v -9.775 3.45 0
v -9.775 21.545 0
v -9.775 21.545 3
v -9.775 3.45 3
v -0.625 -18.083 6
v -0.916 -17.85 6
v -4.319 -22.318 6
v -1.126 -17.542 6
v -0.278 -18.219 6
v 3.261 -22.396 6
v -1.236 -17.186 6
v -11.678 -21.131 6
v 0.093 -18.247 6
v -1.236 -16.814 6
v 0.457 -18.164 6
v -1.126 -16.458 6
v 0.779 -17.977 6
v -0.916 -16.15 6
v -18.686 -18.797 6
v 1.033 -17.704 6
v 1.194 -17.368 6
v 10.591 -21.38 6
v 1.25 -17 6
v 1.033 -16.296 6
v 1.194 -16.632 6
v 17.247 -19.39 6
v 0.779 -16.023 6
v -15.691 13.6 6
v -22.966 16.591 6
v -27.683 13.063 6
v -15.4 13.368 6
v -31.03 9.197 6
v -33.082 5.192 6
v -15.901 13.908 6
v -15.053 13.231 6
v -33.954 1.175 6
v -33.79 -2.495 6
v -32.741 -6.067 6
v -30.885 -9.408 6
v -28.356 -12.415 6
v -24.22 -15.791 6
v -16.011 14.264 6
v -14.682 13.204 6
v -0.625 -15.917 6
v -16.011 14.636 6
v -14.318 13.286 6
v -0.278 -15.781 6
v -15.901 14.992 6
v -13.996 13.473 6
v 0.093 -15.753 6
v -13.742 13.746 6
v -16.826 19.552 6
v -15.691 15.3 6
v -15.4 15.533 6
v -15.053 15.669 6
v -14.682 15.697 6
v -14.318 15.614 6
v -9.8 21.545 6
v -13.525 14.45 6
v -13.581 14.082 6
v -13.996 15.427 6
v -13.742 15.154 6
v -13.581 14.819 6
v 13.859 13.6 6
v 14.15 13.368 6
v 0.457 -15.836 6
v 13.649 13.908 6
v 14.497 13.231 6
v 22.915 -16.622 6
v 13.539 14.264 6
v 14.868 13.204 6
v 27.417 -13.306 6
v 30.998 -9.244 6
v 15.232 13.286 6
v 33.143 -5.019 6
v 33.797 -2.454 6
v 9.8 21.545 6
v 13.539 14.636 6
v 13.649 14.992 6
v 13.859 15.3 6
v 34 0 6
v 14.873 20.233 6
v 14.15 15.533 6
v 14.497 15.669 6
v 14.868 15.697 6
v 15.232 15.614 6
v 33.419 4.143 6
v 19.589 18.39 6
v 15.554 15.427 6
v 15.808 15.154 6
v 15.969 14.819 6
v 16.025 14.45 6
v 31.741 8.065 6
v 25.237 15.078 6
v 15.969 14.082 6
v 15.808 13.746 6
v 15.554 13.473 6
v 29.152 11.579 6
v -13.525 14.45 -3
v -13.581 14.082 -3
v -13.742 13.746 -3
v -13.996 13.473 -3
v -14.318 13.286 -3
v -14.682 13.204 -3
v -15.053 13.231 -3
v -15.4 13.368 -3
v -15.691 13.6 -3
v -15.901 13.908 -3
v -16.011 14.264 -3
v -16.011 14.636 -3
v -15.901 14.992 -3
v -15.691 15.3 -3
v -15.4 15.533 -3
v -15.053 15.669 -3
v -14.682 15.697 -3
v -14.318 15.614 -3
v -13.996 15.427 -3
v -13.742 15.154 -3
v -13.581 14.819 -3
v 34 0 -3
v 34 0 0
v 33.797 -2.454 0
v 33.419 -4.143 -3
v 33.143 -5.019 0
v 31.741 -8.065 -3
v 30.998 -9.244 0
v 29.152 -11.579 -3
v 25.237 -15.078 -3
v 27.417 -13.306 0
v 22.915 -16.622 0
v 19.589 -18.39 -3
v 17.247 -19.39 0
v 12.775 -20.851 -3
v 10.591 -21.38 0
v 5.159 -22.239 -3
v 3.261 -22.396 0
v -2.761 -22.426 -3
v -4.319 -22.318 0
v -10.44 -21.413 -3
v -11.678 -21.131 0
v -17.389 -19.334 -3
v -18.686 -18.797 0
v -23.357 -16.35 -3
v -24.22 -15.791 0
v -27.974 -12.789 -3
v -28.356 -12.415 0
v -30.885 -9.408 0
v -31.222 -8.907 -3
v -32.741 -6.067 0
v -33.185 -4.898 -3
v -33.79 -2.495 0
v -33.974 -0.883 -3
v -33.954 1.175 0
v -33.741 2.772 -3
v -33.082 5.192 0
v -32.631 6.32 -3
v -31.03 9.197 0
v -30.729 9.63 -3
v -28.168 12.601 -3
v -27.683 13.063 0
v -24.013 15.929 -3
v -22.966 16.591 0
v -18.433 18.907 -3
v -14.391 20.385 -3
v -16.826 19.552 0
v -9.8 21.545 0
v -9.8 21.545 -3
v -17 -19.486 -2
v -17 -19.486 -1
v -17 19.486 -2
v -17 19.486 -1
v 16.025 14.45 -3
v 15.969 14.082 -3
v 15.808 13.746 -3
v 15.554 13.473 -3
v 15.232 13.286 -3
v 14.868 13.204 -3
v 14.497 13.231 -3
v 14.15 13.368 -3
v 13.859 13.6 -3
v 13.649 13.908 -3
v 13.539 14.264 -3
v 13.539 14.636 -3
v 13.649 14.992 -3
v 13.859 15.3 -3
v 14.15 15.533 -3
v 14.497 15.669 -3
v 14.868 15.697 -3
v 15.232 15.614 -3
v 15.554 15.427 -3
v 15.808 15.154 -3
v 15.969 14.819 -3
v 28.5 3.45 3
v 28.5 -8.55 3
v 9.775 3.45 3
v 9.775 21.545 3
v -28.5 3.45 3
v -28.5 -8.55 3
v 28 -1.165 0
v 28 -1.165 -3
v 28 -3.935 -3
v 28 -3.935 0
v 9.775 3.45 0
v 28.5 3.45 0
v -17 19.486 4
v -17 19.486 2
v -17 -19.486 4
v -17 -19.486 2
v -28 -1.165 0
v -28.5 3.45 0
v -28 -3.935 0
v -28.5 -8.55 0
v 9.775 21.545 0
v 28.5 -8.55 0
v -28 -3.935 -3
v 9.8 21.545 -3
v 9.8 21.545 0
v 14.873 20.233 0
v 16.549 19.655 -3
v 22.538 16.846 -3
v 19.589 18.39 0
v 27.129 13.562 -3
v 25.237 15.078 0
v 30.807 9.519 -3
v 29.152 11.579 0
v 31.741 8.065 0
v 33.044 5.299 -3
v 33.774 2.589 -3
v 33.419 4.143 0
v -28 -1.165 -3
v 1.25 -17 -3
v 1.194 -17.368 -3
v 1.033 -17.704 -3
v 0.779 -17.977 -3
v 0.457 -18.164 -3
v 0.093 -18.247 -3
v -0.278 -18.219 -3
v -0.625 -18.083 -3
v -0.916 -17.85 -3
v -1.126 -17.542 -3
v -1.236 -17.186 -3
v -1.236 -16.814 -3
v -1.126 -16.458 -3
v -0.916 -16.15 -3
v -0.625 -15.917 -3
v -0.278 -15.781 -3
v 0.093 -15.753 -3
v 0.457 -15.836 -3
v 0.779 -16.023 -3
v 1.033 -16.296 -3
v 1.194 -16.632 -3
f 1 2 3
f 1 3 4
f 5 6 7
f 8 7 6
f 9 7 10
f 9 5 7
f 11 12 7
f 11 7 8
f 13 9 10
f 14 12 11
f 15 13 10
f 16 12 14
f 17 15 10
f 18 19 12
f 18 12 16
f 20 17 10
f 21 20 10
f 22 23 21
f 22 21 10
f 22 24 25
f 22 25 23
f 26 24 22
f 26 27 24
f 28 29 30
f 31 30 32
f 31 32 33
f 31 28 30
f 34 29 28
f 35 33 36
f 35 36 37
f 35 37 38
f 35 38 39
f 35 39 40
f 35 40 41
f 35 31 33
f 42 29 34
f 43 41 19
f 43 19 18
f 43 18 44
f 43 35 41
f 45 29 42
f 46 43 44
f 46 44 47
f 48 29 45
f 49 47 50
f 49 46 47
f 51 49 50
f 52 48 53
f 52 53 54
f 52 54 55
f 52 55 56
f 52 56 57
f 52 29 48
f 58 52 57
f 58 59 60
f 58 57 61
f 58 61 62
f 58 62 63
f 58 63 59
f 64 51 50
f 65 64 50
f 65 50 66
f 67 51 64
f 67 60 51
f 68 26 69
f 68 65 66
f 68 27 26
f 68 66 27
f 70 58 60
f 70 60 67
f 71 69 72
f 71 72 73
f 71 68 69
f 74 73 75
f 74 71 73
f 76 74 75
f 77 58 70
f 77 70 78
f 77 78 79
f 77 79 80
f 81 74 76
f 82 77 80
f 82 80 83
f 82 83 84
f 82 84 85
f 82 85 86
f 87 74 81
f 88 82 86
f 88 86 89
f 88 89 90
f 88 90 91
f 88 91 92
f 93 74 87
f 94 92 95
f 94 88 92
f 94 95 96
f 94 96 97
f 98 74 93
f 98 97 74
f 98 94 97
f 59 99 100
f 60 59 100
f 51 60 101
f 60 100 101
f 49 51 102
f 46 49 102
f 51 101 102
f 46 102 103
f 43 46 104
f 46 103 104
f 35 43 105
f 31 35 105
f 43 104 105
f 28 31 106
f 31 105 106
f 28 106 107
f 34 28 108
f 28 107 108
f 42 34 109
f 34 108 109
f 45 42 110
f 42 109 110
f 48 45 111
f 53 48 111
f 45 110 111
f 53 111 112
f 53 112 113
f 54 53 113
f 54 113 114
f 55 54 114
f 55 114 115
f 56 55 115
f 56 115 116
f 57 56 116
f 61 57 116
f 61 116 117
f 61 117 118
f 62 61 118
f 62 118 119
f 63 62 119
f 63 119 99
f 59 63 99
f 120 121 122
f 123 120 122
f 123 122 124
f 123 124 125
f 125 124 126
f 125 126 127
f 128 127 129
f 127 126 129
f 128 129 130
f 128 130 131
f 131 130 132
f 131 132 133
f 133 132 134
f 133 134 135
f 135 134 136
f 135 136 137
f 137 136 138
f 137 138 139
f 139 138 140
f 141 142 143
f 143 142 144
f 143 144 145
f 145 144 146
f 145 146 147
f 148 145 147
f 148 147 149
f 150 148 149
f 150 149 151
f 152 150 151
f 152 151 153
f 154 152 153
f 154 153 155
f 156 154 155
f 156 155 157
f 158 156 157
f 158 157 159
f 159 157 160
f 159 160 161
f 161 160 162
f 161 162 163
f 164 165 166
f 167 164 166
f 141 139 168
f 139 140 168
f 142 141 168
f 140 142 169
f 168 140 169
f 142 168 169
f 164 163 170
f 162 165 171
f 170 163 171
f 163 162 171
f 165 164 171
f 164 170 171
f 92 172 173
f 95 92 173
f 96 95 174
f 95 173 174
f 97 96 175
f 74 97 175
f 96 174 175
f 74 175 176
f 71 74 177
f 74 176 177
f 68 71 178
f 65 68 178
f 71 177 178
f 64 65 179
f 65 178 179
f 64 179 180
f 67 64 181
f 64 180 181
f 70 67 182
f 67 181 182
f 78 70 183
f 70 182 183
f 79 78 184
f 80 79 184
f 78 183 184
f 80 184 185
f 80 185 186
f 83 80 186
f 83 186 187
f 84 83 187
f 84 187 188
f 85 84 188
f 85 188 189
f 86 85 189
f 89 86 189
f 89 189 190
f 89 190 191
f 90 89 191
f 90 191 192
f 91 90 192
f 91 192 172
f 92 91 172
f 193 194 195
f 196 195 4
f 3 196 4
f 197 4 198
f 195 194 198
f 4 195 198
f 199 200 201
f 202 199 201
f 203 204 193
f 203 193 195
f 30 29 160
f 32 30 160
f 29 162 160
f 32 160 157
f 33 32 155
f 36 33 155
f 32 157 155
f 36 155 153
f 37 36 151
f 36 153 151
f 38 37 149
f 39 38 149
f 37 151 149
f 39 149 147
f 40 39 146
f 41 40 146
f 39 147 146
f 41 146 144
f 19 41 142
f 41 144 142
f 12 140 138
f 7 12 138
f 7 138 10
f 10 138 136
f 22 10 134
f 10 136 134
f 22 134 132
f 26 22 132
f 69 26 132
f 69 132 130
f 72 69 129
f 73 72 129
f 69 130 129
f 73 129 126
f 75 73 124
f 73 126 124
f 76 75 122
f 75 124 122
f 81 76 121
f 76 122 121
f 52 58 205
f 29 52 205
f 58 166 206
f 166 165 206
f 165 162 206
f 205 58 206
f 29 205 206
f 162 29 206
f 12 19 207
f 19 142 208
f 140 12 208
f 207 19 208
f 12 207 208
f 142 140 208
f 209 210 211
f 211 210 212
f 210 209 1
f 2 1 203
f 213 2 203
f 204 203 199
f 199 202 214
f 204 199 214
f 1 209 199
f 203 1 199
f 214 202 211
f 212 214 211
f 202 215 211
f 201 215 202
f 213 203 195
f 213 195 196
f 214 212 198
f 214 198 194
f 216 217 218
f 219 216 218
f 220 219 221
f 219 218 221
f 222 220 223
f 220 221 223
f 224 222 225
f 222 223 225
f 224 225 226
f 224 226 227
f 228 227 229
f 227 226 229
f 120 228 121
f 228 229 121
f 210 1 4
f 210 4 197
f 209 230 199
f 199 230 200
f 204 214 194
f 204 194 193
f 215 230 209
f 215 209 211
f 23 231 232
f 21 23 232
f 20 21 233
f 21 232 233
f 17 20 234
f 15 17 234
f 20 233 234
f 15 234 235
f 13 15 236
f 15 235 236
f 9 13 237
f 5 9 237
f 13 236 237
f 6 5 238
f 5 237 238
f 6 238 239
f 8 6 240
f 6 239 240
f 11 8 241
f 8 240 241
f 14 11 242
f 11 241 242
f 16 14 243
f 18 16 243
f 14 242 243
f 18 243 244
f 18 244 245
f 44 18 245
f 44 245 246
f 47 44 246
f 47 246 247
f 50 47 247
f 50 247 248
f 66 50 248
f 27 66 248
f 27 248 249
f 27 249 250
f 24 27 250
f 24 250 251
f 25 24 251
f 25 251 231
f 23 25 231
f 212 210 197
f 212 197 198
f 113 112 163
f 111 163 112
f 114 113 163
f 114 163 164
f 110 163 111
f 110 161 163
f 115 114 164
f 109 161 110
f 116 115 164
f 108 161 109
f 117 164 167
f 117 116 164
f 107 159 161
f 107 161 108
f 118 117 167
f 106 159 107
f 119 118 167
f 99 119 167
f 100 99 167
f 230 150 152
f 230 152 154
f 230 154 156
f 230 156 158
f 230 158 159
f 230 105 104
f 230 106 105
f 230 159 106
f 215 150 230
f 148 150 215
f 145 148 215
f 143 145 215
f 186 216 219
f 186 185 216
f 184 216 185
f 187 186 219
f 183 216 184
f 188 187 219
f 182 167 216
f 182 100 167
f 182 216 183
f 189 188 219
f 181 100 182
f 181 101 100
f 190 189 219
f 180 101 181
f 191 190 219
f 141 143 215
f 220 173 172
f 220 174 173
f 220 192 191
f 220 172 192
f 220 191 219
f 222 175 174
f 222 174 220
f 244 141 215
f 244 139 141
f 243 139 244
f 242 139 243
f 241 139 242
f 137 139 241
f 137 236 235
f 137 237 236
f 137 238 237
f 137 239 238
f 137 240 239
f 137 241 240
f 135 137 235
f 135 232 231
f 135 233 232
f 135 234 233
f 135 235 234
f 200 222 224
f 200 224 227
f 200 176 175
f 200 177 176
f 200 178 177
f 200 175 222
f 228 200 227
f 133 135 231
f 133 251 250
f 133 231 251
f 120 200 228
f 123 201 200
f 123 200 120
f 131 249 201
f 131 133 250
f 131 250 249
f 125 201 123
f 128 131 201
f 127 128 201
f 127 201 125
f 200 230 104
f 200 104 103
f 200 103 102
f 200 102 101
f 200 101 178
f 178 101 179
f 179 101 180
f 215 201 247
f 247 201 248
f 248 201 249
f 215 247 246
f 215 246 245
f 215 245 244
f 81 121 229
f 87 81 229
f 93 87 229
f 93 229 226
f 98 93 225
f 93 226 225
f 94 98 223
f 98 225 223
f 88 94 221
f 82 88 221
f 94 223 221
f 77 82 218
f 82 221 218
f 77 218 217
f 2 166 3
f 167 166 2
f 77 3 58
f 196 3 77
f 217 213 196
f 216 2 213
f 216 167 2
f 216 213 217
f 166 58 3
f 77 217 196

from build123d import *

# Parameters (mm, degrees)
PAD_DEPTH       = 6
POCKET_DEPTH    = 3
PAD001_DEPTH    = 3
SKETCH003_W     = 56
SKETCH003_H     = 2.77
POCKET001_DEPTH = 3
SKETCH004_W     = 19.6
SKETCH004_H     = 1
POCKET002_DEPTH = 9.001
SKETCH005_R     = 1.25
POCKET003_DEPTH = 9.001


with BuildPart() as part:
    # Sketch → Pad (new body)
    with BuildSketch(Plane.XY):
        with BuildLine():
            add(Edge.make_bspline(
                [(34, 0), (34, 38.971143), (-17, 19.485572), (-68, 0), (-17, -19.485572), (34, -38.971143), (34, 0)],
                knots=[0, 0, 0, 2.094395, 2.094395, 4.18879, 4.18879, 6.283185, 6.283185, 6.283185], degree=2, weights=[1, 0.5, 1, 0.5, 1, 0.5, 1]))
        make_face()
    extrude(amount=PAD_DEPTH)

    # Sketch001 (on Face2 of Pad) → Pocket (cut)
    with BuildSketch(Plane(origin=(0, 0, 0), x_dir=(1, 0, 0), z_dir=(0, 0, -1))):
        Polygon((9.775, -3.450064), (9.775, -21.550064), (-9.775, -21.550064), (-9.775, -3.450064), (-28.5, -3.450064), (-28.5, 8.549936), (28.5, 8.549936), (28.5, -3.450064), align=None)
    extrude(amount=-POCKET_DEPTH, mode=Mode.SUBTRACT)

    # Sketch002 (on Face2 of Pocket) → Pad001 (join)
    with BuildSketch(Plane(origin=(0, 0, 0), x_dir=(1, 0, 0), z_dir=(0, 0, -1))):
        with BuildLine():
            add(Edge.make_bspline(
                [(34, 0), (34, 38.971143), (-17, 19.485572), (-68, 0), (-17, -19.485572), (34, -38.971143), (34, 0)],
                knots=[0, 0, 0, 2.094395, 2.094395, 4.18879, 4.18879, 6.283185, 6.283185, 6.283185], degree=2, weights=[1, 0.5, 1, 0.5, 1, 0.5, 1]))
        make_face()
    extrude(amount=PAD001_DEPTH)

    # Sketch003 (on Face4 of Pad001) → Pocket001 (cut)
    with BuildSketch(Plane(origin=(0, 0, -3), x_dir=(1, 0, 0), z_dir=(0, 0, -1))):
        with Locations((0, 2.549936)):
            Rectangle(SKETCH003_W, SKETCH003_H)
    extrude(amount=-POCKET001_DEPTH, mode=Mode.SUBTRACT)

    # Sketch004 (on Face4 of Pocket001) → Pocket002 (cut, through all)
    with BuildSketch(Plane(origin=(0, 0, -3), x_dir=(1, 0, 0), z_dir=(0, 0, -1))):
        with Locations((0, -22.045091)):
            Rectangle(SKETCH004_W, SKETCH004_H)
    extrude(amount=-POCKET002_DEPTH, mode=Mode.SUBTRACT)

    # Sketch005 (on Face7 of Pocket002) → Pocket003 (cut, through all)
    with BuildSketch(Plane(origin=(0, 0, -3), x_dir=(1, 0, 0), z_dir=(0, 0, -1))):
        with Locations((-14.775, -14.450064)):
            Circle(SKETCH005_R)
        with Locations((0, 17)):
            Circle(SKETCH005_R)
        with Locations((14.775, -14.450064)):
            Circle(SKETCH005_R)
    extrude(amount=-POCKET003_DEPTH, mode=Mode.SUBTRACT)


solid = part.part
